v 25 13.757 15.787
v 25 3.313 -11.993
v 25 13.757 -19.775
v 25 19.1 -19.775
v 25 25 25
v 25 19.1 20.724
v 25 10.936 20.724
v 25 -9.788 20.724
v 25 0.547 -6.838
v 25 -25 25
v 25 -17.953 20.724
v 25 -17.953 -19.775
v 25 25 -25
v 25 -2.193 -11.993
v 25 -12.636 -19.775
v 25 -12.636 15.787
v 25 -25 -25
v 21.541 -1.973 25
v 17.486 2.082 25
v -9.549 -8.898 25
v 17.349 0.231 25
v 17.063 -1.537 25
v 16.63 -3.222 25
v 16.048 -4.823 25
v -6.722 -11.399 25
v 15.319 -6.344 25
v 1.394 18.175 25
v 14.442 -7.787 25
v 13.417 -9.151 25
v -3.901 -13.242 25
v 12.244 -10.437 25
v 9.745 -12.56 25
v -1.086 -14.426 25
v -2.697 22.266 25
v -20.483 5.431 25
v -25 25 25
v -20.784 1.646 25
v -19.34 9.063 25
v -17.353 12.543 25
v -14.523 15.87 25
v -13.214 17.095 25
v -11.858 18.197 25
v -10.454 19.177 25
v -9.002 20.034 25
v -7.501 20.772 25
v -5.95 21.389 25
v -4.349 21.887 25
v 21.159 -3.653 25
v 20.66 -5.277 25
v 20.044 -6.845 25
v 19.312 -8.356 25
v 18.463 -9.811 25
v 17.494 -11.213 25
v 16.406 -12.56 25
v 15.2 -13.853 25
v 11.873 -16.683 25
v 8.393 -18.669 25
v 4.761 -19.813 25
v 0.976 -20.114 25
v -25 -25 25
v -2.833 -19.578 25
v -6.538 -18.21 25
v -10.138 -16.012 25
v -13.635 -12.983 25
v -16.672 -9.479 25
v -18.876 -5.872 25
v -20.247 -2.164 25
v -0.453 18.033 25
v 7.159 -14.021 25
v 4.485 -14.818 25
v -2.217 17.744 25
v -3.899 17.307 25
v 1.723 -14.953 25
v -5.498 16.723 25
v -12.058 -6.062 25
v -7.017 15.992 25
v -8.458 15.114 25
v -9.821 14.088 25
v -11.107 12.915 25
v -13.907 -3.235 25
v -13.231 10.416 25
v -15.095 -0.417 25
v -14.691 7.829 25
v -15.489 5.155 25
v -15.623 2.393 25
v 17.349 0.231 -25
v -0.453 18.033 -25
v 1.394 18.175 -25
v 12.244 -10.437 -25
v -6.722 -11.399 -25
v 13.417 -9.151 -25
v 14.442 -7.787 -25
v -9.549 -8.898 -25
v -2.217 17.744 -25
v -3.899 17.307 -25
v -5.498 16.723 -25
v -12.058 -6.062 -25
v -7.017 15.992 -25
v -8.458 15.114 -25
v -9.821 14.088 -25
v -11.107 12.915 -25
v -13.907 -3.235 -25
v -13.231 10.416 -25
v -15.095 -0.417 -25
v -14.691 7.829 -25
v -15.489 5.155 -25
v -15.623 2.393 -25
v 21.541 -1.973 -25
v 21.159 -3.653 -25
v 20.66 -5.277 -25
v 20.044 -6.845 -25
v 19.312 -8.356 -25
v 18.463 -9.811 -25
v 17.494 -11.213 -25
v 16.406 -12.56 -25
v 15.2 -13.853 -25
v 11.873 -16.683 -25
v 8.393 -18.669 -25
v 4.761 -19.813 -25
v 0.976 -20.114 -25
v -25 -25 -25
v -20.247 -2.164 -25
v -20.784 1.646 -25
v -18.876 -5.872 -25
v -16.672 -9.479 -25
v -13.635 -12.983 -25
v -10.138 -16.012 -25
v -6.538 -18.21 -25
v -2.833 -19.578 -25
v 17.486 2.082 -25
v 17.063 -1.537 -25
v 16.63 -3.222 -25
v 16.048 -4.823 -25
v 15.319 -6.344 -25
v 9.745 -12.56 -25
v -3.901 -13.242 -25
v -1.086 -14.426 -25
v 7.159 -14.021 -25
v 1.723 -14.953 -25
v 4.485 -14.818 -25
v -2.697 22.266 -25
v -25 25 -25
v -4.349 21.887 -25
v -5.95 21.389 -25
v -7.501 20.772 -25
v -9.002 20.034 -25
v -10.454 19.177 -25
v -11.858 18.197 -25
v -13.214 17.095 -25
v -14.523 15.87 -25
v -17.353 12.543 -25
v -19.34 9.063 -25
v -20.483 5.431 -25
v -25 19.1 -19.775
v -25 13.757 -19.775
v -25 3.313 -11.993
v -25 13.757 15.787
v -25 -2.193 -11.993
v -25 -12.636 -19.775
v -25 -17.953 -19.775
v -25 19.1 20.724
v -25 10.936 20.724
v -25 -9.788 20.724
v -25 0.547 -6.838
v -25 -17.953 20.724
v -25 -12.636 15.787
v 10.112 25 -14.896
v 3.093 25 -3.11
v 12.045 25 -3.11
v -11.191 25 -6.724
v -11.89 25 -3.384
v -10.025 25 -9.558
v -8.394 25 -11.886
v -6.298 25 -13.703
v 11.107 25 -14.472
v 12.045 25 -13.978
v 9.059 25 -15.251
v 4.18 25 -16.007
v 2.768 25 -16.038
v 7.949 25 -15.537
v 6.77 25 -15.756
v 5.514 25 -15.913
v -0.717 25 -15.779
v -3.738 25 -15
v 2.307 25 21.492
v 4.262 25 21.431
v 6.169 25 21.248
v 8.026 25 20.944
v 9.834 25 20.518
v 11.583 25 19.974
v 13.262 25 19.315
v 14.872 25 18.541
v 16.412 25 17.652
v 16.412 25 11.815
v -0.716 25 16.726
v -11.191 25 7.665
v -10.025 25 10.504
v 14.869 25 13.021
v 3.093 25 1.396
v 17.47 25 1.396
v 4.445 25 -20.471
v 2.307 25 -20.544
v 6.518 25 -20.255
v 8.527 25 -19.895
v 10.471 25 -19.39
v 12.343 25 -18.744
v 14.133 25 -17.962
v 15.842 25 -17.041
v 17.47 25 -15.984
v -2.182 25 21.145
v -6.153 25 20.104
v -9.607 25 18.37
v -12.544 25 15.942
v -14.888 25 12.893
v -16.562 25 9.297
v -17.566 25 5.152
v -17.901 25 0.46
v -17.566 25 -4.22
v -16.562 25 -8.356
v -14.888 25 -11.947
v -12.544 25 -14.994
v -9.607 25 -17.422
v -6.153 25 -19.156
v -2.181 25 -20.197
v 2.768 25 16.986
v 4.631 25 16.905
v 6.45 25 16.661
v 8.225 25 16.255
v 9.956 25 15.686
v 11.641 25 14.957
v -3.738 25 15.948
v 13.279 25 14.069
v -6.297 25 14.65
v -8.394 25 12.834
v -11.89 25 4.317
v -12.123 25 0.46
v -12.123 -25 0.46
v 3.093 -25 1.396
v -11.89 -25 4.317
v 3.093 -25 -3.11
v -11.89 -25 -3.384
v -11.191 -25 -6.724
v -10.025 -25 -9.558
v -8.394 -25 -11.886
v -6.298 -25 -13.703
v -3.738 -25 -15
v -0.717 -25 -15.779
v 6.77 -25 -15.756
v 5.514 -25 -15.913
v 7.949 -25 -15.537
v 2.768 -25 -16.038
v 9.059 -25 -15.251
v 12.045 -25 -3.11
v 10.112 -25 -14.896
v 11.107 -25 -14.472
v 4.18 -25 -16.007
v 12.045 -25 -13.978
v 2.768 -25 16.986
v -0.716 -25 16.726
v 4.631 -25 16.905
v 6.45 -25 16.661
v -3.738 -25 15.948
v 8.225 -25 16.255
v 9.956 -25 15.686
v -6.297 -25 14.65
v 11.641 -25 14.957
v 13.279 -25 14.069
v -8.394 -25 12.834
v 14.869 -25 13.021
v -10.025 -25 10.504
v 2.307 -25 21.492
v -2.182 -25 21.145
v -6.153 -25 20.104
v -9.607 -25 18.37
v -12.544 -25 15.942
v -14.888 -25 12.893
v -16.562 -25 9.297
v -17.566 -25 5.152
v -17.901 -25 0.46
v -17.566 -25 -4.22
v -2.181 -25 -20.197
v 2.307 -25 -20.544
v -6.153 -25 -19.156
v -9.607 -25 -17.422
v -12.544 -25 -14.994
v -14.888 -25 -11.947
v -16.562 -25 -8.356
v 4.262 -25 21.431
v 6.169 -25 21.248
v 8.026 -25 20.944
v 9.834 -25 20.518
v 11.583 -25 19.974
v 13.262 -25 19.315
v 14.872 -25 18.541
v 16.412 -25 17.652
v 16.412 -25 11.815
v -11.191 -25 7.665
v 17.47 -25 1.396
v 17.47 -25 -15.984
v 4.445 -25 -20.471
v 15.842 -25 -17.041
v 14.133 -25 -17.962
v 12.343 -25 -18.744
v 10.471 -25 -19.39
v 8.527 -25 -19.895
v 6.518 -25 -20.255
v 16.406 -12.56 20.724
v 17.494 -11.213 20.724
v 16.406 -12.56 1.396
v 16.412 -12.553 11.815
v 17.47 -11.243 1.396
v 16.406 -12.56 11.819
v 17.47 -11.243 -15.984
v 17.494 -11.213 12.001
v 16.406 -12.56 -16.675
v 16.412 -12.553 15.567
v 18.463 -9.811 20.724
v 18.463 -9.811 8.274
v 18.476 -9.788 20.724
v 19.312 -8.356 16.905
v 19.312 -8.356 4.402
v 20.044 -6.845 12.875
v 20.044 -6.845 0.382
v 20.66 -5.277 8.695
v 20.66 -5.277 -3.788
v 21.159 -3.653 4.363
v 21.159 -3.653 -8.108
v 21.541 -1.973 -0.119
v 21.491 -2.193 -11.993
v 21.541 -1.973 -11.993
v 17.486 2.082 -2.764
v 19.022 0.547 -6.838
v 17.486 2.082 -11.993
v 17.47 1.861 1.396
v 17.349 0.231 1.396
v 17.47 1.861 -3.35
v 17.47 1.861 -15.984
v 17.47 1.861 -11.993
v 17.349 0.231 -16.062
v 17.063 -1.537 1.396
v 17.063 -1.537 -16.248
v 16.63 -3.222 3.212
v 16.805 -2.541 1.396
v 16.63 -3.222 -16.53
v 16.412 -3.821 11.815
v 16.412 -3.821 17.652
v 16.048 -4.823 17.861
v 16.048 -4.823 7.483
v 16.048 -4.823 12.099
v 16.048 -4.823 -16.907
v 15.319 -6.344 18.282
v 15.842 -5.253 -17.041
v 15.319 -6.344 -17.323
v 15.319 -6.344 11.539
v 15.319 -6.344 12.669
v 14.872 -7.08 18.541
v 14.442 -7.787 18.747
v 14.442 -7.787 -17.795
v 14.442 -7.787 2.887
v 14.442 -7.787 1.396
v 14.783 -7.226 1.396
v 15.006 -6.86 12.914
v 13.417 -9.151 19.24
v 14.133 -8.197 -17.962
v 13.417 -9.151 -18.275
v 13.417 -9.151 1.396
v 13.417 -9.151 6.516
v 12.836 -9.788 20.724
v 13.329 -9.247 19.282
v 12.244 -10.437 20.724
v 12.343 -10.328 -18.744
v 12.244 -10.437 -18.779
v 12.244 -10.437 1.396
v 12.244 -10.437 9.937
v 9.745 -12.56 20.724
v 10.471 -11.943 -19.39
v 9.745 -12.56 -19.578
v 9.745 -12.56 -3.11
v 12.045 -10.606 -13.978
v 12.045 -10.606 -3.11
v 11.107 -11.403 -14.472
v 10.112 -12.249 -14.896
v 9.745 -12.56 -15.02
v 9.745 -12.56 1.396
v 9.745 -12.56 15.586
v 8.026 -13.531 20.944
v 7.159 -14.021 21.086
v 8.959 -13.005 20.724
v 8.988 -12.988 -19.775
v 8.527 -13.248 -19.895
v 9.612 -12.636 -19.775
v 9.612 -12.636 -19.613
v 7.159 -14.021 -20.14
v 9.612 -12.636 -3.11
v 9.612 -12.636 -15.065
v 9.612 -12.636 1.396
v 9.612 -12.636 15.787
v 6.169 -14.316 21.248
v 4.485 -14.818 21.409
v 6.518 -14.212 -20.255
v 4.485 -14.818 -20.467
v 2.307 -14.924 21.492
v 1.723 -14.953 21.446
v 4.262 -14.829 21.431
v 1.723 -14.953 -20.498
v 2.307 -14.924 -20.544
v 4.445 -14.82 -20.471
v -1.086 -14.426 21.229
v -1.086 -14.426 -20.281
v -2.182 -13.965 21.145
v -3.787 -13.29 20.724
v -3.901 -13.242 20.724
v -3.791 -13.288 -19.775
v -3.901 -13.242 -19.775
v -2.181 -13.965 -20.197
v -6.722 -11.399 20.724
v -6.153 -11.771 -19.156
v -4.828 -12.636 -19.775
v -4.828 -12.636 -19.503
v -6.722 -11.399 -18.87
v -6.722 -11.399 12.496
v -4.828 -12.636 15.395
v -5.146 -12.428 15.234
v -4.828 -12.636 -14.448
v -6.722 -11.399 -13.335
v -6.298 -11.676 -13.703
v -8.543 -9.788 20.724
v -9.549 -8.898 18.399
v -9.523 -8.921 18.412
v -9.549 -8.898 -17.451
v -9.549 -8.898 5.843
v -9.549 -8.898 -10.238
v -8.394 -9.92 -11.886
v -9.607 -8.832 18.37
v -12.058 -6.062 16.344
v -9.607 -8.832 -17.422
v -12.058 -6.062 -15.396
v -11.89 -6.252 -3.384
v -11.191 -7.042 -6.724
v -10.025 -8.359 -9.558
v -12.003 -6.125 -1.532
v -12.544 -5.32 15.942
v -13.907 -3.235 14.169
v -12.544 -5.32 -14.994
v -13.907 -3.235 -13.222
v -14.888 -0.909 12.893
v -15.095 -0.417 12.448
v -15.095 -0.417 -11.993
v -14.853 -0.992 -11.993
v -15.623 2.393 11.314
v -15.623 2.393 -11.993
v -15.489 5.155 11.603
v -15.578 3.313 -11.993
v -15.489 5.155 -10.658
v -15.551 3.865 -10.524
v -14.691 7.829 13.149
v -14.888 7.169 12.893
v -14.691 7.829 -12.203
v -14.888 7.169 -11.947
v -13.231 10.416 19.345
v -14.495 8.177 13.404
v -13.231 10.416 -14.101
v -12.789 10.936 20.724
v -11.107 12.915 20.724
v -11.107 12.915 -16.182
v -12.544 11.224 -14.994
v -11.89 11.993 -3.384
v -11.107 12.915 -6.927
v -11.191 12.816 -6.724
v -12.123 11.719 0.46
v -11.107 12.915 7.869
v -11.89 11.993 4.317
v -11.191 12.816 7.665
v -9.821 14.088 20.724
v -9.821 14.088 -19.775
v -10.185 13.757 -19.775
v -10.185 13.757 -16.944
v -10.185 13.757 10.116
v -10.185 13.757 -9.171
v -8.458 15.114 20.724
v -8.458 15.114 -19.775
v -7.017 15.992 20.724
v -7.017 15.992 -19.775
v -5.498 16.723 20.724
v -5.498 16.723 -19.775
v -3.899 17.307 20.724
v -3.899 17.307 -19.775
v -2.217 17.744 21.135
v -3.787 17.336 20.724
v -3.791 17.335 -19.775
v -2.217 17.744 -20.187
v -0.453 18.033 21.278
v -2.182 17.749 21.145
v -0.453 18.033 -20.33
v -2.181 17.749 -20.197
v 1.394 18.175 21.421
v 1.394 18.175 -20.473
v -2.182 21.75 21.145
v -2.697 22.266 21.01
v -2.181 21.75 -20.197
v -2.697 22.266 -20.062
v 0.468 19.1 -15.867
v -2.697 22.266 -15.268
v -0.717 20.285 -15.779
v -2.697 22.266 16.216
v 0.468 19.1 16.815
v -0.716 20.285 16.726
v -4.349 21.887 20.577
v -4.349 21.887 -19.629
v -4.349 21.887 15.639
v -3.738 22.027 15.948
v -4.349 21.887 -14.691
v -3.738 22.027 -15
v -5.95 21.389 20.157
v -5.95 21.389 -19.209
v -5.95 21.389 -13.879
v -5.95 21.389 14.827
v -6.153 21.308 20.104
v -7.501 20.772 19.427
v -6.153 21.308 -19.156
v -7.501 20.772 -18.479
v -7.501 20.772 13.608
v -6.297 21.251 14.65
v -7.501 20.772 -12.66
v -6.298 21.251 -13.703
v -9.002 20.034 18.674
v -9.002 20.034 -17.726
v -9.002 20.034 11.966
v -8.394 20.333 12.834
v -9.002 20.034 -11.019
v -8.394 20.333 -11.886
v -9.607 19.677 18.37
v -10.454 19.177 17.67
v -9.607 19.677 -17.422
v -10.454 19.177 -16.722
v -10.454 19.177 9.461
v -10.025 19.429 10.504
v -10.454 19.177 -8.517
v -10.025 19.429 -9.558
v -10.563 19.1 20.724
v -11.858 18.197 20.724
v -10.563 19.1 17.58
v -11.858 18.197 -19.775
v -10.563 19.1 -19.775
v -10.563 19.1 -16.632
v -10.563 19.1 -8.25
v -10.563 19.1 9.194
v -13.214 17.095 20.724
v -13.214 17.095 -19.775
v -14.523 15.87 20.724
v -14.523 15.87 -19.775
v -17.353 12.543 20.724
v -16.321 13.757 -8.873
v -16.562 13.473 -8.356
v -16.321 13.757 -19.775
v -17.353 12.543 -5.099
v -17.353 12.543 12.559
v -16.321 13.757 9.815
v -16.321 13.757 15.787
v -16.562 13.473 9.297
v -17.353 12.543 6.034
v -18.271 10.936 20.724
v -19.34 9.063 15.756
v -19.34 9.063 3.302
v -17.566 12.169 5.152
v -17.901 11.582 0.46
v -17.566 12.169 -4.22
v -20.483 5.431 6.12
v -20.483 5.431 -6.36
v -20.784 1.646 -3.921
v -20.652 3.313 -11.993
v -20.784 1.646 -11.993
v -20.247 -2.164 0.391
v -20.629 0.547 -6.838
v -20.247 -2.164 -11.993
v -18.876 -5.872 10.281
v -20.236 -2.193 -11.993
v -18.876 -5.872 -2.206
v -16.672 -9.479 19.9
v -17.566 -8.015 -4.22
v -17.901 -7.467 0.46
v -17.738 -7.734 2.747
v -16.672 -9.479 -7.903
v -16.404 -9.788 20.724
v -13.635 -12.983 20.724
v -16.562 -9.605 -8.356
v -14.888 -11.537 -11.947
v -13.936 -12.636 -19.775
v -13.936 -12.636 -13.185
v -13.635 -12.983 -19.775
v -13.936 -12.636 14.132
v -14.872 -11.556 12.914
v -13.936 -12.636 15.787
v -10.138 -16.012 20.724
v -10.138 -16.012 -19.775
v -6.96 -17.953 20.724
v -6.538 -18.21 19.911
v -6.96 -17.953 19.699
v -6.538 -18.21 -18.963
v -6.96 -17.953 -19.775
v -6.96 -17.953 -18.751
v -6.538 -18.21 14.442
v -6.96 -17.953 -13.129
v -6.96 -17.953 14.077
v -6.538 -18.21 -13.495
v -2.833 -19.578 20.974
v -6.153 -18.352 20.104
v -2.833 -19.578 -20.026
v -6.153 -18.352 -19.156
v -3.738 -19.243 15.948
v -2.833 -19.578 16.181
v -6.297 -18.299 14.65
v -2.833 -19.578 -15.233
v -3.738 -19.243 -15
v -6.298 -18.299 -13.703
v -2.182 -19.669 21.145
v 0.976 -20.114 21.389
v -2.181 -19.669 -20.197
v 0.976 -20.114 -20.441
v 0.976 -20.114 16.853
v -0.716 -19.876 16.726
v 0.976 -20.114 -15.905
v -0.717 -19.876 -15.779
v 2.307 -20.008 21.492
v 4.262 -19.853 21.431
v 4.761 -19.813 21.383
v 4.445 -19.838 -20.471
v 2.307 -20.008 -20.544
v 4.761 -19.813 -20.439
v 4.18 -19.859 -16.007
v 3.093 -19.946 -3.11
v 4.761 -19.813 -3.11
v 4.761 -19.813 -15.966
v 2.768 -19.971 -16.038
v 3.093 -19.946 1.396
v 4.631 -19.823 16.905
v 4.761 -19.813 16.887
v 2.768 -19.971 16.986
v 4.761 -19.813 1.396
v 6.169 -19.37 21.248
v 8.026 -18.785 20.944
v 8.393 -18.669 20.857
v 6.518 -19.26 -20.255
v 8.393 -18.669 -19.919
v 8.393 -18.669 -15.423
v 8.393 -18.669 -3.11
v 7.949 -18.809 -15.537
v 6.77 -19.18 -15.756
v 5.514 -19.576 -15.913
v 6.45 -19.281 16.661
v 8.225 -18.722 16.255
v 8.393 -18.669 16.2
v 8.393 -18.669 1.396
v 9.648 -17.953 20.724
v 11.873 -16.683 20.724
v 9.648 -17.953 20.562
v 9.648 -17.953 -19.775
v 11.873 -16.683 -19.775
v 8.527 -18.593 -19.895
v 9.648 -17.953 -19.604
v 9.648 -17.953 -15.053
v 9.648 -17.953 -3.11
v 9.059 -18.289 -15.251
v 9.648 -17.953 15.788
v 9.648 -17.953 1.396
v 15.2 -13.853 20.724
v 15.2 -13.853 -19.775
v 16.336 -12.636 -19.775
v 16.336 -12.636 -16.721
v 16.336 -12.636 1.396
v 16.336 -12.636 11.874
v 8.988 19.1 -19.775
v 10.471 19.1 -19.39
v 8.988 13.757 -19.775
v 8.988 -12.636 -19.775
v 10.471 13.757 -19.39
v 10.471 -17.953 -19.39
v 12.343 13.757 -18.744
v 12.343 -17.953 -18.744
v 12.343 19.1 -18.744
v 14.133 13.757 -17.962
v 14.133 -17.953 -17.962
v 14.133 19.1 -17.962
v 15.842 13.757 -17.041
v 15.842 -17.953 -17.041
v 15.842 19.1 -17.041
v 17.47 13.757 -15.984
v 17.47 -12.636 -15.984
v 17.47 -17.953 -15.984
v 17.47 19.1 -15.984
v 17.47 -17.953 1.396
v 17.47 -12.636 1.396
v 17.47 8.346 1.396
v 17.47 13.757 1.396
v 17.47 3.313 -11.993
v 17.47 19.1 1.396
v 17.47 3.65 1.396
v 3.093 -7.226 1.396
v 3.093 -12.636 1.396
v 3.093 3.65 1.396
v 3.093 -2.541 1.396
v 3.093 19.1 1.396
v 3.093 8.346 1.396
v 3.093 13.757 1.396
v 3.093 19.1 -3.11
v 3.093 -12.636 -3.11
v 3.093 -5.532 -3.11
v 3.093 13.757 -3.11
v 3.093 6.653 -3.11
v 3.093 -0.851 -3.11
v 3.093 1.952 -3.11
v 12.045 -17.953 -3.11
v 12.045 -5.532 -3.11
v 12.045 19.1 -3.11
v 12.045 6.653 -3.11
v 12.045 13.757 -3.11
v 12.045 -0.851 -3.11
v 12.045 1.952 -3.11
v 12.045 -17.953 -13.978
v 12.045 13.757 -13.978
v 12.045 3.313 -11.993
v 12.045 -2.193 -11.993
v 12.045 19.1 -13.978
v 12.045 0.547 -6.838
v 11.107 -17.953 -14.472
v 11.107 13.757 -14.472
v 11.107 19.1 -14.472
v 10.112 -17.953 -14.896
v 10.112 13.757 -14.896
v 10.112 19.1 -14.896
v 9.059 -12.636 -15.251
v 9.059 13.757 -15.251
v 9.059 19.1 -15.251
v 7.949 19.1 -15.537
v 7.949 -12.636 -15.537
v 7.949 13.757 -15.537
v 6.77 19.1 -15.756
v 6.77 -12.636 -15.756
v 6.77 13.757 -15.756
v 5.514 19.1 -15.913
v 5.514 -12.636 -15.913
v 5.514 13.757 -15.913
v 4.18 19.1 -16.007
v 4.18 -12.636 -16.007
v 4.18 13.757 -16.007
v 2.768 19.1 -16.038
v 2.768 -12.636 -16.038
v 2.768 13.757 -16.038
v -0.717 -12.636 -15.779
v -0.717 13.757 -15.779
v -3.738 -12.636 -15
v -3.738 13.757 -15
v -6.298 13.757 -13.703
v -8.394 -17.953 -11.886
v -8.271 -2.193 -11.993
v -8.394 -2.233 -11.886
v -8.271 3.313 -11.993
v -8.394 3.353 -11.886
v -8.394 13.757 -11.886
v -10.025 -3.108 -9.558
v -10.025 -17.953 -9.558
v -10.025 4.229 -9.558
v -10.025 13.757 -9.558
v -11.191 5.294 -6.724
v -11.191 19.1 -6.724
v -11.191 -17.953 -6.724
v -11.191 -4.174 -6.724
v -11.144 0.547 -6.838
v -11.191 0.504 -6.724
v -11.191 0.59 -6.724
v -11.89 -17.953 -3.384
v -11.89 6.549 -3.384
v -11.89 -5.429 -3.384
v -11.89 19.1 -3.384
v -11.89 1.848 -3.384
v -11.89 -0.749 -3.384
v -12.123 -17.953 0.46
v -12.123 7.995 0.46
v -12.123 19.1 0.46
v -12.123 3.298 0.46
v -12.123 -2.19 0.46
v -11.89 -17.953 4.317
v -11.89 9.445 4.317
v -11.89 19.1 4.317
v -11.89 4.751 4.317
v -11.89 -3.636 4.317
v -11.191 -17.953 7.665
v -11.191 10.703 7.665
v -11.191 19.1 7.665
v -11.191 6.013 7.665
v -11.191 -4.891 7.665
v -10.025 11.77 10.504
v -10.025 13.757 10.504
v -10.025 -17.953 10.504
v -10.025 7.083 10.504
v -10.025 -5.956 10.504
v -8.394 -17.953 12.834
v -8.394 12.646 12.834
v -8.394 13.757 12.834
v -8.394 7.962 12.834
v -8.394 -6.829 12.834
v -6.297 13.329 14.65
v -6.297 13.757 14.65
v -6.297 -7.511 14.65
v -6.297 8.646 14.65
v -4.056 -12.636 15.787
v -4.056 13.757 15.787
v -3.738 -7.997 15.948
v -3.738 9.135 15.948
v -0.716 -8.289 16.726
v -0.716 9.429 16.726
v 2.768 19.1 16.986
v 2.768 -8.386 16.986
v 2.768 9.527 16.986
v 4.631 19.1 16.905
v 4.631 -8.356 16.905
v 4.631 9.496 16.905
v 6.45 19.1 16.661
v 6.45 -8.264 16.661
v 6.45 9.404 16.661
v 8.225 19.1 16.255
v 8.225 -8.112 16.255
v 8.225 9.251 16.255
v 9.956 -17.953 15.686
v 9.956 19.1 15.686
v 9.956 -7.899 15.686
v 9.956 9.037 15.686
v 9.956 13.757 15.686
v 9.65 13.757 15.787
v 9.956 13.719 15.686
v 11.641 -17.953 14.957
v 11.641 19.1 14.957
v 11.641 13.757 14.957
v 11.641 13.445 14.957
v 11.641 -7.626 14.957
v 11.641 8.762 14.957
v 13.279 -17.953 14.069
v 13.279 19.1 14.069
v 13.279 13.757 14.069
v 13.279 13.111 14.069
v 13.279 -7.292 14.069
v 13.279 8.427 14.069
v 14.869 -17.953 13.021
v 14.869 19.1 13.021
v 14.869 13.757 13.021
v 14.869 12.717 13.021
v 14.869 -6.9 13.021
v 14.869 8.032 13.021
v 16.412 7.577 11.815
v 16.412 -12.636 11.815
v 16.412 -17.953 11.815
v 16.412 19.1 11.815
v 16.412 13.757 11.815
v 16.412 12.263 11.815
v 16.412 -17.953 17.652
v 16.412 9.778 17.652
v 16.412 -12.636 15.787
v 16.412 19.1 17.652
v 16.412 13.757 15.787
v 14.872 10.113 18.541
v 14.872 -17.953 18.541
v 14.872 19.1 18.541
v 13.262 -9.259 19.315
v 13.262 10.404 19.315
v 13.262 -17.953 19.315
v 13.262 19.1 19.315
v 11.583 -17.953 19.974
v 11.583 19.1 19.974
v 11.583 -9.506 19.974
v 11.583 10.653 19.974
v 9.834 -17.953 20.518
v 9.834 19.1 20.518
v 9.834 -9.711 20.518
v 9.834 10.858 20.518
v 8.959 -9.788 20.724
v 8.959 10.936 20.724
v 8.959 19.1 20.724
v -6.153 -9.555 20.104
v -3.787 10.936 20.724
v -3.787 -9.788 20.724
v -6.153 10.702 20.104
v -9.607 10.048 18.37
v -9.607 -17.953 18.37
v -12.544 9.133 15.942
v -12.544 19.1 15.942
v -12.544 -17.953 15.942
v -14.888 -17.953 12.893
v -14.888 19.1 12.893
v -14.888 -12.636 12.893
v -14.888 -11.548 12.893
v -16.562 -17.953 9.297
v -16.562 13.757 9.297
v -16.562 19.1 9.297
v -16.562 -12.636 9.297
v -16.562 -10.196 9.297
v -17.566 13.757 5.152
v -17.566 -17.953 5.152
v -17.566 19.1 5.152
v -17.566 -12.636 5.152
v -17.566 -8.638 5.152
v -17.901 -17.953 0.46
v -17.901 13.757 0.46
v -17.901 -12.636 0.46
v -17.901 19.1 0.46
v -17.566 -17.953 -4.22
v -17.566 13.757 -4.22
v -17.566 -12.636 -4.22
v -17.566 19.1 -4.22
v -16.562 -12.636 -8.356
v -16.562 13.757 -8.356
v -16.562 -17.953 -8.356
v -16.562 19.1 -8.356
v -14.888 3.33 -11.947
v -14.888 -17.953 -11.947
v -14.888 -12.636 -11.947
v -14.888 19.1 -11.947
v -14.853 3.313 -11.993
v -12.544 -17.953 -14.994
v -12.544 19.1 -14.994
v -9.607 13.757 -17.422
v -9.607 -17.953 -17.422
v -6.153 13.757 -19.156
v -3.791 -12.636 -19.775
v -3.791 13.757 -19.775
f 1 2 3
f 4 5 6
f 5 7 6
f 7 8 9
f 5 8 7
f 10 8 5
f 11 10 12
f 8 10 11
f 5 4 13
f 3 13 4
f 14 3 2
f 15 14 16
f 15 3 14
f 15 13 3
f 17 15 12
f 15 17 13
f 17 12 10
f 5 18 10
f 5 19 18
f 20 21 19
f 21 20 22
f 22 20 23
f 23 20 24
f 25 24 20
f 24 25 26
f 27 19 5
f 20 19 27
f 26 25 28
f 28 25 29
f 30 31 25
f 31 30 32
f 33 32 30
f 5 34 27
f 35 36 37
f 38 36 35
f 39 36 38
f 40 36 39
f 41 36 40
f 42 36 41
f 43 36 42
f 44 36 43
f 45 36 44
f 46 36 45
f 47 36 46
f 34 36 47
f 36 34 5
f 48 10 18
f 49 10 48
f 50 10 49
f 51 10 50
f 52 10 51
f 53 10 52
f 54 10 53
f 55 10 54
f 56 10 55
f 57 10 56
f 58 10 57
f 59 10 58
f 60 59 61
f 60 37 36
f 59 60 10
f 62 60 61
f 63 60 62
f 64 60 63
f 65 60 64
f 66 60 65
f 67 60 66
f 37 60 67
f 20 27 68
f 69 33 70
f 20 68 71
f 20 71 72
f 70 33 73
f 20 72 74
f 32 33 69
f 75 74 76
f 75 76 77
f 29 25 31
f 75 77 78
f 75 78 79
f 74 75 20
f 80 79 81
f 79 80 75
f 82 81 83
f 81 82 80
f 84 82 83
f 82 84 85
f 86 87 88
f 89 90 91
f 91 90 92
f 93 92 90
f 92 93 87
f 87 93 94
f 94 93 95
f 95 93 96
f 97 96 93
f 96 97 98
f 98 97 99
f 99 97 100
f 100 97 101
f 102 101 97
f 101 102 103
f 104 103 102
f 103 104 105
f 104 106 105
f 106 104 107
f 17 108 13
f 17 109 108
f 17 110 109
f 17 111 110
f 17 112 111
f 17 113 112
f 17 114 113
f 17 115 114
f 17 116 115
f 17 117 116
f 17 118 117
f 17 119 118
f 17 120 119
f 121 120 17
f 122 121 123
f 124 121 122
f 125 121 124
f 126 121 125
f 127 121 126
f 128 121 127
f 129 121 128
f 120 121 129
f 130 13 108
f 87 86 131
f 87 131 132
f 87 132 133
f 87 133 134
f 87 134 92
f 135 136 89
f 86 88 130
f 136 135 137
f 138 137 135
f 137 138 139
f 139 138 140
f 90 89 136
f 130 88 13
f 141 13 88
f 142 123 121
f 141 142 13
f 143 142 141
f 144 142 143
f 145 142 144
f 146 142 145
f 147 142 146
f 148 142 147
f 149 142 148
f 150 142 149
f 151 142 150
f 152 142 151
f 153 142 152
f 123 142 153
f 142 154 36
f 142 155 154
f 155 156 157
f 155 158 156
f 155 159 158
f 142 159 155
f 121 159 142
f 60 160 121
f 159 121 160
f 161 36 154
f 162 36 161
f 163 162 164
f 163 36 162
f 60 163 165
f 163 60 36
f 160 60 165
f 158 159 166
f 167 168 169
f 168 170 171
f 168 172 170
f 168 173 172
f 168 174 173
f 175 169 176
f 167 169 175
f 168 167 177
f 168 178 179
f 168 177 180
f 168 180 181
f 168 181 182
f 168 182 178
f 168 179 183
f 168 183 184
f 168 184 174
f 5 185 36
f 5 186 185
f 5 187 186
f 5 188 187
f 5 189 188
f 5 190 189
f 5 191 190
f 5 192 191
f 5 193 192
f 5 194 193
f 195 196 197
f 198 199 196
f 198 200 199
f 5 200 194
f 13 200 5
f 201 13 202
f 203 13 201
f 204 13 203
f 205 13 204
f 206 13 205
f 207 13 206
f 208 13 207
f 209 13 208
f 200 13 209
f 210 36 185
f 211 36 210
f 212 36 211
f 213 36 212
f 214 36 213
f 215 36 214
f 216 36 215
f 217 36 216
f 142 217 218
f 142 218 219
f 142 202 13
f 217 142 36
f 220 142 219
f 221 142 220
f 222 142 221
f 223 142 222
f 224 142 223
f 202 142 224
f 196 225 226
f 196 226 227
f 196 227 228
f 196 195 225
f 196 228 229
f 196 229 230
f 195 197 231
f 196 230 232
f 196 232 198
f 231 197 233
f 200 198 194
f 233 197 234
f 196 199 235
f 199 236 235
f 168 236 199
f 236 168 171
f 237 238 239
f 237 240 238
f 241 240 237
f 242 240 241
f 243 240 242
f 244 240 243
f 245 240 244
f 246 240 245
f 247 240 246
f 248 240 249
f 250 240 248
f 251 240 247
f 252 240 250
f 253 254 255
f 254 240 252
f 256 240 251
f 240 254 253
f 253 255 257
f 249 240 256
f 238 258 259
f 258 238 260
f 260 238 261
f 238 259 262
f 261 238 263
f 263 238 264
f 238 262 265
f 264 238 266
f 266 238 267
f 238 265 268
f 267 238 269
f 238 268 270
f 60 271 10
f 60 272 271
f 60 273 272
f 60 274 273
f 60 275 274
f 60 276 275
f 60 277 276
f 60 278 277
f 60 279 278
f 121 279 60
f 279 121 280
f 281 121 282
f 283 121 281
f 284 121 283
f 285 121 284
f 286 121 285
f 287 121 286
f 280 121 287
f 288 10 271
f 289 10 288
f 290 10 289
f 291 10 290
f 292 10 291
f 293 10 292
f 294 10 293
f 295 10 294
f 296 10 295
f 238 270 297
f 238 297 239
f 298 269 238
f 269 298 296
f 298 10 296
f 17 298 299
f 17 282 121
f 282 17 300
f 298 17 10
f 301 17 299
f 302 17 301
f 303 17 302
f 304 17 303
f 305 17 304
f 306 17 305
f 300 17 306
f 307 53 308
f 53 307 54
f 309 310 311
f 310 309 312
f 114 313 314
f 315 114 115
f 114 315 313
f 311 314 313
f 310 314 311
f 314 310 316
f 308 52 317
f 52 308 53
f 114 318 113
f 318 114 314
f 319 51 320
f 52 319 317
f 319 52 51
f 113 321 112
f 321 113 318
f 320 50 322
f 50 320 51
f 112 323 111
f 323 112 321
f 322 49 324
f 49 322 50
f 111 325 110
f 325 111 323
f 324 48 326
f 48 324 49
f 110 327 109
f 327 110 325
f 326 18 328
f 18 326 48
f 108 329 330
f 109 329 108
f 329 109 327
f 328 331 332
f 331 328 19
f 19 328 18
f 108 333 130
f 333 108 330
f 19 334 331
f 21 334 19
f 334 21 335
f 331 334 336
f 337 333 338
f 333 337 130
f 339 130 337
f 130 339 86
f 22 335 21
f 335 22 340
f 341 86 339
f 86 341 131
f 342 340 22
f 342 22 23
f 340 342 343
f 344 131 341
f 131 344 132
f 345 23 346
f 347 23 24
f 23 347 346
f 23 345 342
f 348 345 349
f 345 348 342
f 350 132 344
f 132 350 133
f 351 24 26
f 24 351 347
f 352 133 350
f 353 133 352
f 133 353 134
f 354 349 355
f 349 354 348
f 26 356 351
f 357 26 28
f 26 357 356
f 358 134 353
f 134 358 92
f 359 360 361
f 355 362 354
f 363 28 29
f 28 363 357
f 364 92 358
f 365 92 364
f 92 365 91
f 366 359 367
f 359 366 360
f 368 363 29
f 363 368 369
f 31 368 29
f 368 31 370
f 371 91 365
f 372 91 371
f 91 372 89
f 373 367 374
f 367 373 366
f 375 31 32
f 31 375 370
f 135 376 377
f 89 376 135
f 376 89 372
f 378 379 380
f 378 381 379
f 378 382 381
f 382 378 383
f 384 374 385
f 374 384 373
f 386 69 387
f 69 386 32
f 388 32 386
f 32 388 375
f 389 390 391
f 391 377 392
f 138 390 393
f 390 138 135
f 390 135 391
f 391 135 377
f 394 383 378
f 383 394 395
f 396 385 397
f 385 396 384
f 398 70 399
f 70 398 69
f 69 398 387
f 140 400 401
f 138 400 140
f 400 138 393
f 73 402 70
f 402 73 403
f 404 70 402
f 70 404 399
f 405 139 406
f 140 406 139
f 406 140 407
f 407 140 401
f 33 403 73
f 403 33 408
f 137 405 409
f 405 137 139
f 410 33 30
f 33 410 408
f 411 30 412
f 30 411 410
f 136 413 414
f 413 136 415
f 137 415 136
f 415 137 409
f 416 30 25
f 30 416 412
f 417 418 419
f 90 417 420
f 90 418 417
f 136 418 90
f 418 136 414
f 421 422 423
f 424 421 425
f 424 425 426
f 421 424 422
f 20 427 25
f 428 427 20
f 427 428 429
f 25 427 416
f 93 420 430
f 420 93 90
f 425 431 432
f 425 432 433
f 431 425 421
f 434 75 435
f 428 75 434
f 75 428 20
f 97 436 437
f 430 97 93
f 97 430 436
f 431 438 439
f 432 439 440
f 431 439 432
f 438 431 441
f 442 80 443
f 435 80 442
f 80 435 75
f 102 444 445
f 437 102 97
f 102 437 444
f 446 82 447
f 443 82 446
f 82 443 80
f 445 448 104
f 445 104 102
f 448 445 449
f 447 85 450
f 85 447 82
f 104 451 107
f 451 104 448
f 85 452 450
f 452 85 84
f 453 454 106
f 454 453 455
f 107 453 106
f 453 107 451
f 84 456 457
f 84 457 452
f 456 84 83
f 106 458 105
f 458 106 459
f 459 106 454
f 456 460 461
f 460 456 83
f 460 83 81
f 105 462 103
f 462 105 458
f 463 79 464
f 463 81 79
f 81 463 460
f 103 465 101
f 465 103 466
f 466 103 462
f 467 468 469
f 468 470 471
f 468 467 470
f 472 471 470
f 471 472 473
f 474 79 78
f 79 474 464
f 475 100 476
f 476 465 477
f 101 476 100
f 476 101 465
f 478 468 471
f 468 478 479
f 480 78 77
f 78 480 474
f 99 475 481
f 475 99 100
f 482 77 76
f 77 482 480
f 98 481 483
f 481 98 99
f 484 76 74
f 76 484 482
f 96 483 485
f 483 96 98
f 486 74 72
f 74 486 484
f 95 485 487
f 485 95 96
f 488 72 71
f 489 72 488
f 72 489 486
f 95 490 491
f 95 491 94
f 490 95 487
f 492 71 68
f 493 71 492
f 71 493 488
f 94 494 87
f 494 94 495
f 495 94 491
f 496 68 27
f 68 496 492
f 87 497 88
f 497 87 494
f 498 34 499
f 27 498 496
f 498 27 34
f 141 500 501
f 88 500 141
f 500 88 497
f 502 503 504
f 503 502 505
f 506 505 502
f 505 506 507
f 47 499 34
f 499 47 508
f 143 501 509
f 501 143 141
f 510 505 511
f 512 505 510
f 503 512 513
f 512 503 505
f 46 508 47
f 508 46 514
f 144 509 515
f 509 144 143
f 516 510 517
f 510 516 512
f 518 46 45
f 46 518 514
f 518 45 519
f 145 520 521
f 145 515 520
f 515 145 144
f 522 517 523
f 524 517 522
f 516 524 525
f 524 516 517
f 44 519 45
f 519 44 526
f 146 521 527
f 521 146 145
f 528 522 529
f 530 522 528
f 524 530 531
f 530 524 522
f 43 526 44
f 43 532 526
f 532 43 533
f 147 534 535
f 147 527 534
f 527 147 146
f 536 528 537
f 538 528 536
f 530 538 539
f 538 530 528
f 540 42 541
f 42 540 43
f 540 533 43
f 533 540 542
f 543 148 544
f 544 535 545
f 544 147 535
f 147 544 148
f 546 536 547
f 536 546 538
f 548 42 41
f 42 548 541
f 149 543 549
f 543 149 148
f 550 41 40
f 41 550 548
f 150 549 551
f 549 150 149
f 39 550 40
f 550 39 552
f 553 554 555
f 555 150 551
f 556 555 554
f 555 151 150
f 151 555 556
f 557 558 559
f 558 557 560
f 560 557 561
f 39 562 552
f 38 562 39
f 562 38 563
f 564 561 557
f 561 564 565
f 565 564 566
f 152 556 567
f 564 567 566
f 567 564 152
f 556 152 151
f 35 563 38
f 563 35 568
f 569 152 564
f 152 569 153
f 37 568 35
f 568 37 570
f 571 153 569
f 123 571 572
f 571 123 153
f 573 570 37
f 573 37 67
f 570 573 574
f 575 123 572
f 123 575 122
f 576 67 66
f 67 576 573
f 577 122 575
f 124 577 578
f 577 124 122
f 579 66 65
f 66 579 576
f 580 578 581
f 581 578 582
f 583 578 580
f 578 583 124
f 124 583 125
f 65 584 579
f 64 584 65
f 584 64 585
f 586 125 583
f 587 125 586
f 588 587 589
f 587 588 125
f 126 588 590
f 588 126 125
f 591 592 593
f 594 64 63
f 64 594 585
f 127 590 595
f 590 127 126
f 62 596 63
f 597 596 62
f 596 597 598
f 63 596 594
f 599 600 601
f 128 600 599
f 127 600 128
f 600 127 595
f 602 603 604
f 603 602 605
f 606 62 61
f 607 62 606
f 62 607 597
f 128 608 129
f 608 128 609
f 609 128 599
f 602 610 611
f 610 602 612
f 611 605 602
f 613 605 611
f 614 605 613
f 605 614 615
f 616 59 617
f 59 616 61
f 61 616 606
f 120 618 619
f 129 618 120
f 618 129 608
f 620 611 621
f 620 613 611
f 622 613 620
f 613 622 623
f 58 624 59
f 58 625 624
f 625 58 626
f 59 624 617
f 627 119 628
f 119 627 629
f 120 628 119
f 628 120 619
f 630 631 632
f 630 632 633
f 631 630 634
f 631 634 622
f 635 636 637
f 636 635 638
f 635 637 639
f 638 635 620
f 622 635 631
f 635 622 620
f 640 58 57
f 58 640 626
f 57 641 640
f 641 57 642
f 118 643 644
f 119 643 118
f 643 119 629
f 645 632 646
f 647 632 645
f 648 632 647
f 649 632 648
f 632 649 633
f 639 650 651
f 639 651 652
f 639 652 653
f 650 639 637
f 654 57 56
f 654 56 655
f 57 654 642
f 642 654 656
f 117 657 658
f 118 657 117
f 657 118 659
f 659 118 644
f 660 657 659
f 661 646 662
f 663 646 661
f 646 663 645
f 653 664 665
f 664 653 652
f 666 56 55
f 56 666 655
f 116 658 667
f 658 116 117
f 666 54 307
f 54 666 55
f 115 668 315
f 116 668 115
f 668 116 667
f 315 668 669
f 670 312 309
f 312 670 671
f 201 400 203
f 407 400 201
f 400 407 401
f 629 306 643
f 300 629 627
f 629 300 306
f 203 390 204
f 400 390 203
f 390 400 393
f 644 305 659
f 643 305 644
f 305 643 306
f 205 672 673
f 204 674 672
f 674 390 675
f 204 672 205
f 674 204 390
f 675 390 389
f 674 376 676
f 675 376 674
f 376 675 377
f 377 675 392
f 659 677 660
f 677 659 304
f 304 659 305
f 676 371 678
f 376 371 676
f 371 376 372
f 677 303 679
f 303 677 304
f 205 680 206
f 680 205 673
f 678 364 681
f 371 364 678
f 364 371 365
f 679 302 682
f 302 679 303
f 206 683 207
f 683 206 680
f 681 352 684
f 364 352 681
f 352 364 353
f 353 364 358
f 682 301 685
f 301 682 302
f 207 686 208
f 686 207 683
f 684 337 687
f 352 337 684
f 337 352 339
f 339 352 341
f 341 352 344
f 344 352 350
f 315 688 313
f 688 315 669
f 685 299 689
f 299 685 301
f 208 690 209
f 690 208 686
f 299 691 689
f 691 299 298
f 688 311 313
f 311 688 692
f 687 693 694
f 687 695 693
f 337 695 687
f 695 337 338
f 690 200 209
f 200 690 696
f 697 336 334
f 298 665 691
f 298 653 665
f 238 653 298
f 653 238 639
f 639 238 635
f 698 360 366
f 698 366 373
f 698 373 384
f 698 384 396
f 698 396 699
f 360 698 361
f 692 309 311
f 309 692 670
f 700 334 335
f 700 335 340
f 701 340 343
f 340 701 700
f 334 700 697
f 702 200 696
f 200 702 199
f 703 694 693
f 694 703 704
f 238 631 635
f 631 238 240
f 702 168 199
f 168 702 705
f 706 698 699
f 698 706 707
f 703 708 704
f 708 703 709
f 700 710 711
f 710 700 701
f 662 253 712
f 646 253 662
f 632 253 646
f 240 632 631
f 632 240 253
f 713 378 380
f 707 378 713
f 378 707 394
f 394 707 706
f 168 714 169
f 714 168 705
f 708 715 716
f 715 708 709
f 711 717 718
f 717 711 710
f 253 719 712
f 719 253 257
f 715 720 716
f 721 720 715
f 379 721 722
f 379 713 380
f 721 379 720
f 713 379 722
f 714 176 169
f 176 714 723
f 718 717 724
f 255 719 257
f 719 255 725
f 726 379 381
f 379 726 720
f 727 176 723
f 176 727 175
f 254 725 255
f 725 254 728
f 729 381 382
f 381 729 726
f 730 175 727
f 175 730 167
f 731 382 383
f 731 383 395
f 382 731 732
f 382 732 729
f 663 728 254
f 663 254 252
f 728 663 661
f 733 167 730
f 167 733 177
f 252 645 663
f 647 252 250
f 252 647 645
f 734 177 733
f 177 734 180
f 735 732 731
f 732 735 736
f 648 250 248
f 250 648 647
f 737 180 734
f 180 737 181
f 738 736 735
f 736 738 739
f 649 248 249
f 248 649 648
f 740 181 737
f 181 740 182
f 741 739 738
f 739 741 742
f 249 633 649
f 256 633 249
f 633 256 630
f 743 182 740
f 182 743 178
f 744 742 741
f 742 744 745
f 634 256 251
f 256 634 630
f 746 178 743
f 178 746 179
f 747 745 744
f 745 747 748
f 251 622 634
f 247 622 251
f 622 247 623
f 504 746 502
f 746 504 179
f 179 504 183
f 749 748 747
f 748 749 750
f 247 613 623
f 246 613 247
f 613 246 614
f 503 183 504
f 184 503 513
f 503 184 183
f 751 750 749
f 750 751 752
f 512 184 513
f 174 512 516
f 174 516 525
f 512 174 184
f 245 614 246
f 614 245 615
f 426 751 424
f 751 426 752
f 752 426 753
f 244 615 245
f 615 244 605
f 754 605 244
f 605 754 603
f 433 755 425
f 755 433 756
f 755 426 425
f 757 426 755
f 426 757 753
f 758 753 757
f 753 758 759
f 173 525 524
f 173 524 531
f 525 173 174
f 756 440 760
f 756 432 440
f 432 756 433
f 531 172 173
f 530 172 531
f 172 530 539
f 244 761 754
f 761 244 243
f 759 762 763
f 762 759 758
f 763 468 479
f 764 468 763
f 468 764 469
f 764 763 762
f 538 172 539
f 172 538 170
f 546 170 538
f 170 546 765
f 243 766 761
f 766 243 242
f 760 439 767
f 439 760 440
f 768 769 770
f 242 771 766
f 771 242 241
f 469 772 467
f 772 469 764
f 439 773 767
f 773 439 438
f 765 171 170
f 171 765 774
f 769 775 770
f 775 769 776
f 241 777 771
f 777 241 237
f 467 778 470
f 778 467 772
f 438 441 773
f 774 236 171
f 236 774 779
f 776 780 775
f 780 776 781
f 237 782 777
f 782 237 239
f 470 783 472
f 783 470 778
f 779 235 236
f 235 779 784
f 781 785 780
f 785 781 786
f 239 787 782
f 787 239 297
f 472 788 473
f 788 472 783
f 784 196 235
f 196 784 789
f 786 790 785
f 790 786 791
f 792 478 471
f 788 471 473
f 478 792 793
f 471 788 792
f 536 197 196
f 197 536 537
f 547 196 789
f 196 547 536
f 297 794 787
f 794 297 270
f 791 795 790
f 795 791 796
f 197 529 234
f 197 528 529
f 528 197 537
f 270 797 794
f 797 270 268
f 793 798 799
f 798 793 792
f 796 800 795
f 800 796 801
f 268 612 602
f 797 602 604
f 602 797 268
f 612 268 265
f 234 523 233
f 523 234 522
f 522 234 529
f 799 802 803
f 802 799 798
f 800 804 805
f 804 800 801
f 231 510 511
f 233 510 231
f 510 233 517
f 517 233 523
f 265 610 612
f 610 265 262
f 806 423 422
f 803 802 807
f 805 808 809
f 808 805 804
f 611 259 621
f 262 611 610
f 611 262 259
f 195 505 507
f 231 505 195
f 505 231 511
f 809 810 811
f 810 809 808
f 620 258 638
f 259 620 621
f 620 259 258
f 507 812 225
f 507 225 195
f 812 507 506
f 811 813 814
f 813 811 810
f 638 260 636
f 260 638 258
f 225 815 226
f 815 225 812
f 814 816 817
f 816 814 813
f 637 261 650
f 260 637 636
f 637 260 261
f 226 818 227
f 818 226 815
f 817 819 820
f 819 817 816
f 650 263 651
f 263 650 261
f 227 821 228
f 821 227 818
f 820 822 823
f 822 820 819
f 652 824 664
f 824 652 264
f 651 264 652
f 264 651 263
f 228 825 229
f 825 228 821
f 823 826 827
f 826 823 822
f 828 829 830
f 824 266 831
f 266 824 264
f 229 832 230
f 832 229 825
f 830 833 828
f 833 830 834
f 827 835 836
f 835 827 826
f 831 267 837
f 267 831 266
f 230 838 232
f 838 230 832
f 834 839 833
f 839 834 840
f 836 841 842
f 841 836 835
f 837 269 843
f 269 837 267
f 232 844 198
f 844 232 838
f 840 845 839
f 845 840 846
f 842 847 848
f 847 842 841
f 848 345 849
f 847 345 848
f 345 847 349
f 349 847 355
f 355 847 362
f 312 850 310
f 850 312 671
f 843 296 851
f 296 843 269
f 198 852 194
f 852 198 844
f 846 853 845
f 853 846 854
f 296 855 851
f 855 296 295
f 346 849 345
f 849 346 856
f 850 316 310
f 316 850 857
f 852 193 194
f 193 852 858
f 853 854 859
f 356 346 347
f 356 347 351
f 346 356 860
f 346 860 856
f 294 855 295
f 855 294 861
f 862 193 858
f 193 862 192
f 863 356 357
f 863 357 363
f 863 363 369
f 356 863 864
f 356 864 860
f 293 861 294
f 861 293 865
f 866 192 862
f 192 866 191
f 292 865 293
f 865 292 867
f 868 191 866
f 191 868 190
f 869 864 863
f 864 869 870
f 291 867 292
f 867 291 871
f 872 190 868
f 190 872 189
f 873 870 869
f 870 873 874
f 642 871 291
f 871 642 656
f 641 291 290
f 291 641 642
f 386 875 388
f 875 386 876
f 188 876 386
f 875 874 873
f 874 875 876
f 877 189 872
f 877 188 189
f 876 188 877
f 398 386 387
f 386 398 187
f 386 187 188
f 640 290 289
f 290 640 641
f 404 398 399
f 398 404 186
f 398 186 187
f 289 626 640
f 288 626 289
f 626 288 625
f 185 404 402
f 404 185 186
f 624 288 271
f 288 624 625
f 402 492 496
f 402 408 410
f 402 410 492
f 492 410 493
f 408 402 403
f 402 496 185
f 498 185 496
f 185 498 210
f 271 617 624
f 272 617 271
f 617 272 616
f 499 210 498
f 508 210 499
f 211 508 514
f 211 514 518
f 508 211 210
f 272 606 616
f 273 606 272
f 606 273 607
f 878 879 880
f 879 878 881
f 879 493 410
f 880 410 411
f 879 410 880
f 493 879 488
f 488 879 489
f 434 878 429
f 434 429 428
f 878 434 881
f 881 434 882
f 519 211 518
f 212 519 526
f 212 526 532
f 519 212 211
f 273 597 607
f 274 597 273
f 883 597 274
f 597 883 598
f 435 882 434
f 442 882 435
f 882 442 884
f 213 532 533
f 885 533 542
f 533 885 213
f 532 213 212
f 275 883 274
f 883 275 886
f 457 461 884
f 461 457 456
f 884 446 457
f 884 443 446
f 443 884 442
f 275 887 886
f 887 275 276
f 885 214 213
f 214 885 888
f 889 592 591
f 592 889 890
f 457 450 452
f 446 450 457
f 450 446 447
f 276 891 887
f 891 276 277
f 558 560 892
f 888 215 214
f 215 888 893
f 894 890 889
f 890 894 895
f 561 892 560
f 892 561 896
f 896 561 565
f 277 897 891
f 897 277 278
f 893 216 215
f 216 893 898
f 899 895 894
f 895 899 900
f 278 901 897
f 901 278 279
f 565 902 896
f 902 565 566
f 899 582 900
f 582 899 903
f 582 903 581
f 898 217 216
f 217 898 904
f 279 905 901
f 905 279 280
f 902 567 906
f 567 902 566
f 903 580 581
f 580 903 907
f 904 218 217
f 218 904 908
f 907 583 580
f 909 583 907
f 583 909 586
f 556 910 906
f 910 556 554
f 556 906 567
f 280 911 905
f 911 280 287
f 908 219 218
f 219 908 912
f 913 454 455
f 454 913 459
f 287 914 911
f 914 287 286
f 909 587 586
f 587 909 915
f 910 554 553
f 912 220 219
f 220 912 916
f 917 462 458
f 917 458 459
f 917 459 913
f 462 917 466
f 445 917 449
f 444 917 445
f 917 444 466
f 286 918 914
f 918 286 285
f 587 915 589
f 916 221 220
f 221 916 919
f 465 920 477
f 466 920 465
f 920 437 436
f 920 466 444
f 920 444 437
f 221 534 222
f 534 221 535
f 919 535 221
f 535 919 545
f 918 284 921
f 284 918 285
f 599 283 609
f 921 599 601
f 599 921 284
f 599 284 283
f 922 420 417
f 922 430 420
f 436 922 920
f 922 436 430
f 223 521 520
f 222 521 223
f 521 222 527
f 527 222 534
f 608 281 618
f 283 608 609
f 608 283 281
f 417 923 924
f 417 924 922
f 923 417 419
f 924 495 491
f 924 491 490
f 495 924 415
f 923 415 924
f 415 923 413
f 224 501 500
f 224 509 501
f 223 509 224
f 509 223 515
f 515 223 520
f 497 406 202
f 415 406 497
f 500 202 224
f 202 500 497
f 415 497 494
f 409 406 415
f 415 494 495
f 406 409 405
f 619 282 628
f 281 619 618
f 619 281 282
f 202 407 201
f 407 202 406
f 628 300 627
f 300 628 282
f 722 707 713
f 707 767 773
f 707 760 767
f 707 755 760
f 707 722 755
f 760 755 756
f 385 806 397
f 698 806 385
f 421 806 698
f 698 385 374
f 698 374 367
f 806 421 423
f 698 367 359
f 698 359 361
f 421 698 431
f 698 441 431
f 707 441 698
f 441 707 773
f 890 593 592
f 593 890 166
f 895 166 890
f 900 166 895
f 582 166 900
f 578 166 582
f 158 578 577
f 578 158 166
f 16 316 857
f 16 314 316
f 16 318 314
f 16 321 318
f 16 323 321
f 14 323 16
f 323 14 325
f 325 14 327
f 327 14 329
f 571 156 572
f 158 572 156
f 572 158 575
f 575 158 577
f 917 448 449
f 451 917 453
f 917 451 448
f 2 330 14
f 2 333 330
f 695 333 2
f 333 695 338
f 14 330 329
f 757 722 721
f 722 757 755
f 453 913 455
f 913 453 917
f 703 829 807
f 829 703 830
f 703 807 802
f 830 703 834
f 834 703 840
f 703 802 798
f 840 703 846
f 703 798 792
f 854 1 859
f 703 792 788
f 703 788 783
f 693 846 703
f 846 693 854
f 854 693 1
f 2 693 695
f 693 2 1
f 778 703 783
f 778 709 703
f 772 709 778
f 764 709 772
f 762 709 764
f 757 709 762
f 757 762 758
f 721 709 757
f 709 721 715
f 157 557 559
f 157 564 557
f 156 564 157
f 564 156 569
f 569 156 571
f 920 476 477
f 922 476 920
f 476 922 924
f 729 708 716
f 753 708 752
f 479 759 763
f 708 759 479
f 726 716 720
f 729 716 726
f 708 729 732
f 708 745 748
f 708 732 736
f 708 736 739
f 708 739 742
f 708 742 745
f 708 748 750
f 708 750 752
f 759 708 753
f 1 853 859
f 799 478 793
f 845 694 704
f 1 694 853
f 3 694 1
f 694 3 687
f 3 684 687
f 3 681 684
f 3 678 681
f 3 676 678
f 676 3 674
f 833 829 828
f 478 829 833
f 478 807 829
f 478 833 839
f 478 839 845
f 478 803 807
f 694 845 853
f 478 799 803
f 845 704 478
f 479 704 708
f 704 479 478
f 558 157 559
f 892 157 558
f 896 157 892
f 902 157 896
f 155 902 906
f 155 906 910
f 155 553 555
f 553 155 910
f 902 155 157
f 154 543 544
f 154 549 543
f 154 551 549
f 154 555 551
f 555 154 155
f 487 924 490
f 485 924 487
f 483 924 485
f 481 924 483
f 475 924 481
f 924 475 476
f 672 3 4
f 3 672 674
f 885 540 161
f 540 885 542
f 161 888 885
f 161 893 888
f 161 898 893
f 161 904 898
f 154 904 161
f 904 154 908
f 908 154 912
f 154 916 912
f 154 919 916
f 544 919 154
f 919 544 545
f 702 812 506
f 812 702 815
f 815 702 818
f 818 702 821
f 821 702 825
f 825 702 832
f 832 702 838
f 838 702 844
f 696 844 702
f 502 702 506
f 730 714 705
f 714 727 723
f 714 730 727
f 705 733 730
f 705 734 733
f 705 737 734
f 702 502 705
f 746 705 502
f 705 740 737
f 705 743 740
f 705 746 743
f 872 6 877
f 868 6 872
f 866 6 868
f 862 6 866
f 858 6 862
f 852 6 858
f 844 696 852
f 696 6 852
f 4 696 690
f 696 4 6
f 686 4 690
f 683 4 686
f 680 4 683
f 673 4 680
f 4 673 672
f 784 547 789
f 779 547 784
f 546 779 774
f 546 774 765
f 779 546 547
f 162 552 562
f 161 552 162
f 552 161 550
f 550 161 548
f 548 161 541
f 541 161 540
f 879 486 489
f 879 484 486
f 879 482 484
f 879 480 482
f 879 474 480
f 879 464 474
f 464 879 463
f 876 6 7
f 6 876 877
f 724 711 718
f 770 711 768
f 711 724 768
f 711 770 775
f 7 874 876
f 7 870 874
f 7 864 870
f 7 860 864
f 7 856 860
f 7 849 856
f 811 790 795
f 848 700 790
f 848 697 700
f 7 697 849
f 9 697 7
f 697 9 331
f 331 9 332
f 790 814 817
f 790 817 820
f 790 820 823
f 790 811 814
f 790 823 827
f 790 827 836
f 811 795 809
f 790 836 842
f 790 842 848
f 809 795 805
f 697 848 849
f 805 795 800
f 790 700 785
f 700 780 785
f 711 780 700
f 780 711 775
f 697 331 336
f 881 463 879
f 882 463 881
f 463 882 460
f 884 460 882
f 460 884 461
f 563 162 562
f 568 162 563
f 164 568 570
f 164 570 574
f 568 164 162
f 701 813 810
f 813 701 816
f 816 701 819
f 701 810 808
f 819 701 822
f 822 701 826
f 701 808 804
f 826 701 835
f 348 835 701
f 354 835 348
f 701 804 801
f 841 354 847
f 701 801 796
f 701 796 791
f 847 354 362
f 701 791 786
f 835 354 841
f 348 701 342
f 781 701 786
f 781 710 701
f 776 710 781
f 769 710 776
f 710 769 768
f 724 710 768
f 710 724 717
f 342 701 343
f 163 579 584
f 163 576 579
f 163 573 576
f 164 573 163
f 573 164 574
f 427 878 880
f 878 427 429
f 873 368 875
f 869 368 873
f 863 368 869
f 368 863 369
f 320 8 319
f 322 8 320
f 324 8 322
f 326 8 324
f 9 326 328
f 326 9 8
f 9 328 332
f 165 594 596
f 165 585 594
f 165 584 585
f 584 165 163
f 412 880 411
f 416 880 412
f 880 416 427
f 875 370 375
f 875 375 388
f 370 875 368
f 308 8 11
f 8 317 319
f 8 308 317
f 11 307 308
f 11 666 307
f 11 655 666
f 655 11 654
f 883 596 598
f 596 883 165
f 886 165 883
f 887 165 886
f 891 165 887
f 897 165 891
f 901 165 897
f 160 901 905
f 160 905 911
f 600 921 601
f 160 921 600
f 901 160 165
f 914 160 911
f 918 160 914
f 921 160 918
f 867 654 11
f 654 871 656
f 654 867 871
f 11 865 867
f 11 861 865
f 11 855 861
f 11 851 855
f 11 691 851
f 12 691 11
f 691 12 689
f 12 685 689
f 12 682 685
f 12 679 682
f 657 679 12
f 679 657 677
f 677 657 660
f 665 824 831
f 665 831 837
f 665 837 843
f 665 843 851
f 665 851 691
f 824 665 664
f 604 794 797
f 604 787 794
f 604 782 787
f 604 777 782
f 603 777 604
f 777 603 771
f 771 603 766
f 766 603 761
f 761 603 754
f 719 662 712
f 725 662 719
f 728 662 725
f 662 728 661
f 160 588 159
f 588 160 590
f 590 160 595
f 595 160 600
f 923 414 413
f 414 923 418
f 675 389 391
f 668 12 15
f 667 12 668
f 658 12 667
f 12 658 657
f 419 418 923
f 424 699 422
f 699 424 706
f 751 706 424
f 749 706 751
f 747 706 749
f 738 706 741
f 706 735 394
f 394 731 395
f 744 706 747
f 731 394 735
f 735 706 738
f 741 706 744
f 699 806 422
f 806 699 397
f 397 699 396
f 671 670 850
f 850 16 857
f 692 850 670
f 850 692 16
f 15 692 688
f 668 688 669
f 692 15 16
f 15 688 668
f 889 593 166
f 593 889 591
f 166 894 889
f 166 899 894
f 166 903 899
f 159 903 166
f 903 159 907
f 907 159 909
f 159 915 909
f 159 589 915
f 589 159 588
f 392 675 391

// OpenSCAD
difference() {
    cube(50, center=true);
    rotate([0,0,45]) translate([-3,0,0]) linear_extrude(100, center=true) text("C", size=40, halign="center", valign="center", font="open sans extrabold");
    rotate([90,0,0]) linear_extrude(100, center=true) text("G", size=40, halign="center", valign="center", font="open sans extrabold");
    rotate([90,0,90]) linear_extrude(100, center=true) text("M", size=40, halign="center", valign="center", font="open sans extrabold");
    
}
